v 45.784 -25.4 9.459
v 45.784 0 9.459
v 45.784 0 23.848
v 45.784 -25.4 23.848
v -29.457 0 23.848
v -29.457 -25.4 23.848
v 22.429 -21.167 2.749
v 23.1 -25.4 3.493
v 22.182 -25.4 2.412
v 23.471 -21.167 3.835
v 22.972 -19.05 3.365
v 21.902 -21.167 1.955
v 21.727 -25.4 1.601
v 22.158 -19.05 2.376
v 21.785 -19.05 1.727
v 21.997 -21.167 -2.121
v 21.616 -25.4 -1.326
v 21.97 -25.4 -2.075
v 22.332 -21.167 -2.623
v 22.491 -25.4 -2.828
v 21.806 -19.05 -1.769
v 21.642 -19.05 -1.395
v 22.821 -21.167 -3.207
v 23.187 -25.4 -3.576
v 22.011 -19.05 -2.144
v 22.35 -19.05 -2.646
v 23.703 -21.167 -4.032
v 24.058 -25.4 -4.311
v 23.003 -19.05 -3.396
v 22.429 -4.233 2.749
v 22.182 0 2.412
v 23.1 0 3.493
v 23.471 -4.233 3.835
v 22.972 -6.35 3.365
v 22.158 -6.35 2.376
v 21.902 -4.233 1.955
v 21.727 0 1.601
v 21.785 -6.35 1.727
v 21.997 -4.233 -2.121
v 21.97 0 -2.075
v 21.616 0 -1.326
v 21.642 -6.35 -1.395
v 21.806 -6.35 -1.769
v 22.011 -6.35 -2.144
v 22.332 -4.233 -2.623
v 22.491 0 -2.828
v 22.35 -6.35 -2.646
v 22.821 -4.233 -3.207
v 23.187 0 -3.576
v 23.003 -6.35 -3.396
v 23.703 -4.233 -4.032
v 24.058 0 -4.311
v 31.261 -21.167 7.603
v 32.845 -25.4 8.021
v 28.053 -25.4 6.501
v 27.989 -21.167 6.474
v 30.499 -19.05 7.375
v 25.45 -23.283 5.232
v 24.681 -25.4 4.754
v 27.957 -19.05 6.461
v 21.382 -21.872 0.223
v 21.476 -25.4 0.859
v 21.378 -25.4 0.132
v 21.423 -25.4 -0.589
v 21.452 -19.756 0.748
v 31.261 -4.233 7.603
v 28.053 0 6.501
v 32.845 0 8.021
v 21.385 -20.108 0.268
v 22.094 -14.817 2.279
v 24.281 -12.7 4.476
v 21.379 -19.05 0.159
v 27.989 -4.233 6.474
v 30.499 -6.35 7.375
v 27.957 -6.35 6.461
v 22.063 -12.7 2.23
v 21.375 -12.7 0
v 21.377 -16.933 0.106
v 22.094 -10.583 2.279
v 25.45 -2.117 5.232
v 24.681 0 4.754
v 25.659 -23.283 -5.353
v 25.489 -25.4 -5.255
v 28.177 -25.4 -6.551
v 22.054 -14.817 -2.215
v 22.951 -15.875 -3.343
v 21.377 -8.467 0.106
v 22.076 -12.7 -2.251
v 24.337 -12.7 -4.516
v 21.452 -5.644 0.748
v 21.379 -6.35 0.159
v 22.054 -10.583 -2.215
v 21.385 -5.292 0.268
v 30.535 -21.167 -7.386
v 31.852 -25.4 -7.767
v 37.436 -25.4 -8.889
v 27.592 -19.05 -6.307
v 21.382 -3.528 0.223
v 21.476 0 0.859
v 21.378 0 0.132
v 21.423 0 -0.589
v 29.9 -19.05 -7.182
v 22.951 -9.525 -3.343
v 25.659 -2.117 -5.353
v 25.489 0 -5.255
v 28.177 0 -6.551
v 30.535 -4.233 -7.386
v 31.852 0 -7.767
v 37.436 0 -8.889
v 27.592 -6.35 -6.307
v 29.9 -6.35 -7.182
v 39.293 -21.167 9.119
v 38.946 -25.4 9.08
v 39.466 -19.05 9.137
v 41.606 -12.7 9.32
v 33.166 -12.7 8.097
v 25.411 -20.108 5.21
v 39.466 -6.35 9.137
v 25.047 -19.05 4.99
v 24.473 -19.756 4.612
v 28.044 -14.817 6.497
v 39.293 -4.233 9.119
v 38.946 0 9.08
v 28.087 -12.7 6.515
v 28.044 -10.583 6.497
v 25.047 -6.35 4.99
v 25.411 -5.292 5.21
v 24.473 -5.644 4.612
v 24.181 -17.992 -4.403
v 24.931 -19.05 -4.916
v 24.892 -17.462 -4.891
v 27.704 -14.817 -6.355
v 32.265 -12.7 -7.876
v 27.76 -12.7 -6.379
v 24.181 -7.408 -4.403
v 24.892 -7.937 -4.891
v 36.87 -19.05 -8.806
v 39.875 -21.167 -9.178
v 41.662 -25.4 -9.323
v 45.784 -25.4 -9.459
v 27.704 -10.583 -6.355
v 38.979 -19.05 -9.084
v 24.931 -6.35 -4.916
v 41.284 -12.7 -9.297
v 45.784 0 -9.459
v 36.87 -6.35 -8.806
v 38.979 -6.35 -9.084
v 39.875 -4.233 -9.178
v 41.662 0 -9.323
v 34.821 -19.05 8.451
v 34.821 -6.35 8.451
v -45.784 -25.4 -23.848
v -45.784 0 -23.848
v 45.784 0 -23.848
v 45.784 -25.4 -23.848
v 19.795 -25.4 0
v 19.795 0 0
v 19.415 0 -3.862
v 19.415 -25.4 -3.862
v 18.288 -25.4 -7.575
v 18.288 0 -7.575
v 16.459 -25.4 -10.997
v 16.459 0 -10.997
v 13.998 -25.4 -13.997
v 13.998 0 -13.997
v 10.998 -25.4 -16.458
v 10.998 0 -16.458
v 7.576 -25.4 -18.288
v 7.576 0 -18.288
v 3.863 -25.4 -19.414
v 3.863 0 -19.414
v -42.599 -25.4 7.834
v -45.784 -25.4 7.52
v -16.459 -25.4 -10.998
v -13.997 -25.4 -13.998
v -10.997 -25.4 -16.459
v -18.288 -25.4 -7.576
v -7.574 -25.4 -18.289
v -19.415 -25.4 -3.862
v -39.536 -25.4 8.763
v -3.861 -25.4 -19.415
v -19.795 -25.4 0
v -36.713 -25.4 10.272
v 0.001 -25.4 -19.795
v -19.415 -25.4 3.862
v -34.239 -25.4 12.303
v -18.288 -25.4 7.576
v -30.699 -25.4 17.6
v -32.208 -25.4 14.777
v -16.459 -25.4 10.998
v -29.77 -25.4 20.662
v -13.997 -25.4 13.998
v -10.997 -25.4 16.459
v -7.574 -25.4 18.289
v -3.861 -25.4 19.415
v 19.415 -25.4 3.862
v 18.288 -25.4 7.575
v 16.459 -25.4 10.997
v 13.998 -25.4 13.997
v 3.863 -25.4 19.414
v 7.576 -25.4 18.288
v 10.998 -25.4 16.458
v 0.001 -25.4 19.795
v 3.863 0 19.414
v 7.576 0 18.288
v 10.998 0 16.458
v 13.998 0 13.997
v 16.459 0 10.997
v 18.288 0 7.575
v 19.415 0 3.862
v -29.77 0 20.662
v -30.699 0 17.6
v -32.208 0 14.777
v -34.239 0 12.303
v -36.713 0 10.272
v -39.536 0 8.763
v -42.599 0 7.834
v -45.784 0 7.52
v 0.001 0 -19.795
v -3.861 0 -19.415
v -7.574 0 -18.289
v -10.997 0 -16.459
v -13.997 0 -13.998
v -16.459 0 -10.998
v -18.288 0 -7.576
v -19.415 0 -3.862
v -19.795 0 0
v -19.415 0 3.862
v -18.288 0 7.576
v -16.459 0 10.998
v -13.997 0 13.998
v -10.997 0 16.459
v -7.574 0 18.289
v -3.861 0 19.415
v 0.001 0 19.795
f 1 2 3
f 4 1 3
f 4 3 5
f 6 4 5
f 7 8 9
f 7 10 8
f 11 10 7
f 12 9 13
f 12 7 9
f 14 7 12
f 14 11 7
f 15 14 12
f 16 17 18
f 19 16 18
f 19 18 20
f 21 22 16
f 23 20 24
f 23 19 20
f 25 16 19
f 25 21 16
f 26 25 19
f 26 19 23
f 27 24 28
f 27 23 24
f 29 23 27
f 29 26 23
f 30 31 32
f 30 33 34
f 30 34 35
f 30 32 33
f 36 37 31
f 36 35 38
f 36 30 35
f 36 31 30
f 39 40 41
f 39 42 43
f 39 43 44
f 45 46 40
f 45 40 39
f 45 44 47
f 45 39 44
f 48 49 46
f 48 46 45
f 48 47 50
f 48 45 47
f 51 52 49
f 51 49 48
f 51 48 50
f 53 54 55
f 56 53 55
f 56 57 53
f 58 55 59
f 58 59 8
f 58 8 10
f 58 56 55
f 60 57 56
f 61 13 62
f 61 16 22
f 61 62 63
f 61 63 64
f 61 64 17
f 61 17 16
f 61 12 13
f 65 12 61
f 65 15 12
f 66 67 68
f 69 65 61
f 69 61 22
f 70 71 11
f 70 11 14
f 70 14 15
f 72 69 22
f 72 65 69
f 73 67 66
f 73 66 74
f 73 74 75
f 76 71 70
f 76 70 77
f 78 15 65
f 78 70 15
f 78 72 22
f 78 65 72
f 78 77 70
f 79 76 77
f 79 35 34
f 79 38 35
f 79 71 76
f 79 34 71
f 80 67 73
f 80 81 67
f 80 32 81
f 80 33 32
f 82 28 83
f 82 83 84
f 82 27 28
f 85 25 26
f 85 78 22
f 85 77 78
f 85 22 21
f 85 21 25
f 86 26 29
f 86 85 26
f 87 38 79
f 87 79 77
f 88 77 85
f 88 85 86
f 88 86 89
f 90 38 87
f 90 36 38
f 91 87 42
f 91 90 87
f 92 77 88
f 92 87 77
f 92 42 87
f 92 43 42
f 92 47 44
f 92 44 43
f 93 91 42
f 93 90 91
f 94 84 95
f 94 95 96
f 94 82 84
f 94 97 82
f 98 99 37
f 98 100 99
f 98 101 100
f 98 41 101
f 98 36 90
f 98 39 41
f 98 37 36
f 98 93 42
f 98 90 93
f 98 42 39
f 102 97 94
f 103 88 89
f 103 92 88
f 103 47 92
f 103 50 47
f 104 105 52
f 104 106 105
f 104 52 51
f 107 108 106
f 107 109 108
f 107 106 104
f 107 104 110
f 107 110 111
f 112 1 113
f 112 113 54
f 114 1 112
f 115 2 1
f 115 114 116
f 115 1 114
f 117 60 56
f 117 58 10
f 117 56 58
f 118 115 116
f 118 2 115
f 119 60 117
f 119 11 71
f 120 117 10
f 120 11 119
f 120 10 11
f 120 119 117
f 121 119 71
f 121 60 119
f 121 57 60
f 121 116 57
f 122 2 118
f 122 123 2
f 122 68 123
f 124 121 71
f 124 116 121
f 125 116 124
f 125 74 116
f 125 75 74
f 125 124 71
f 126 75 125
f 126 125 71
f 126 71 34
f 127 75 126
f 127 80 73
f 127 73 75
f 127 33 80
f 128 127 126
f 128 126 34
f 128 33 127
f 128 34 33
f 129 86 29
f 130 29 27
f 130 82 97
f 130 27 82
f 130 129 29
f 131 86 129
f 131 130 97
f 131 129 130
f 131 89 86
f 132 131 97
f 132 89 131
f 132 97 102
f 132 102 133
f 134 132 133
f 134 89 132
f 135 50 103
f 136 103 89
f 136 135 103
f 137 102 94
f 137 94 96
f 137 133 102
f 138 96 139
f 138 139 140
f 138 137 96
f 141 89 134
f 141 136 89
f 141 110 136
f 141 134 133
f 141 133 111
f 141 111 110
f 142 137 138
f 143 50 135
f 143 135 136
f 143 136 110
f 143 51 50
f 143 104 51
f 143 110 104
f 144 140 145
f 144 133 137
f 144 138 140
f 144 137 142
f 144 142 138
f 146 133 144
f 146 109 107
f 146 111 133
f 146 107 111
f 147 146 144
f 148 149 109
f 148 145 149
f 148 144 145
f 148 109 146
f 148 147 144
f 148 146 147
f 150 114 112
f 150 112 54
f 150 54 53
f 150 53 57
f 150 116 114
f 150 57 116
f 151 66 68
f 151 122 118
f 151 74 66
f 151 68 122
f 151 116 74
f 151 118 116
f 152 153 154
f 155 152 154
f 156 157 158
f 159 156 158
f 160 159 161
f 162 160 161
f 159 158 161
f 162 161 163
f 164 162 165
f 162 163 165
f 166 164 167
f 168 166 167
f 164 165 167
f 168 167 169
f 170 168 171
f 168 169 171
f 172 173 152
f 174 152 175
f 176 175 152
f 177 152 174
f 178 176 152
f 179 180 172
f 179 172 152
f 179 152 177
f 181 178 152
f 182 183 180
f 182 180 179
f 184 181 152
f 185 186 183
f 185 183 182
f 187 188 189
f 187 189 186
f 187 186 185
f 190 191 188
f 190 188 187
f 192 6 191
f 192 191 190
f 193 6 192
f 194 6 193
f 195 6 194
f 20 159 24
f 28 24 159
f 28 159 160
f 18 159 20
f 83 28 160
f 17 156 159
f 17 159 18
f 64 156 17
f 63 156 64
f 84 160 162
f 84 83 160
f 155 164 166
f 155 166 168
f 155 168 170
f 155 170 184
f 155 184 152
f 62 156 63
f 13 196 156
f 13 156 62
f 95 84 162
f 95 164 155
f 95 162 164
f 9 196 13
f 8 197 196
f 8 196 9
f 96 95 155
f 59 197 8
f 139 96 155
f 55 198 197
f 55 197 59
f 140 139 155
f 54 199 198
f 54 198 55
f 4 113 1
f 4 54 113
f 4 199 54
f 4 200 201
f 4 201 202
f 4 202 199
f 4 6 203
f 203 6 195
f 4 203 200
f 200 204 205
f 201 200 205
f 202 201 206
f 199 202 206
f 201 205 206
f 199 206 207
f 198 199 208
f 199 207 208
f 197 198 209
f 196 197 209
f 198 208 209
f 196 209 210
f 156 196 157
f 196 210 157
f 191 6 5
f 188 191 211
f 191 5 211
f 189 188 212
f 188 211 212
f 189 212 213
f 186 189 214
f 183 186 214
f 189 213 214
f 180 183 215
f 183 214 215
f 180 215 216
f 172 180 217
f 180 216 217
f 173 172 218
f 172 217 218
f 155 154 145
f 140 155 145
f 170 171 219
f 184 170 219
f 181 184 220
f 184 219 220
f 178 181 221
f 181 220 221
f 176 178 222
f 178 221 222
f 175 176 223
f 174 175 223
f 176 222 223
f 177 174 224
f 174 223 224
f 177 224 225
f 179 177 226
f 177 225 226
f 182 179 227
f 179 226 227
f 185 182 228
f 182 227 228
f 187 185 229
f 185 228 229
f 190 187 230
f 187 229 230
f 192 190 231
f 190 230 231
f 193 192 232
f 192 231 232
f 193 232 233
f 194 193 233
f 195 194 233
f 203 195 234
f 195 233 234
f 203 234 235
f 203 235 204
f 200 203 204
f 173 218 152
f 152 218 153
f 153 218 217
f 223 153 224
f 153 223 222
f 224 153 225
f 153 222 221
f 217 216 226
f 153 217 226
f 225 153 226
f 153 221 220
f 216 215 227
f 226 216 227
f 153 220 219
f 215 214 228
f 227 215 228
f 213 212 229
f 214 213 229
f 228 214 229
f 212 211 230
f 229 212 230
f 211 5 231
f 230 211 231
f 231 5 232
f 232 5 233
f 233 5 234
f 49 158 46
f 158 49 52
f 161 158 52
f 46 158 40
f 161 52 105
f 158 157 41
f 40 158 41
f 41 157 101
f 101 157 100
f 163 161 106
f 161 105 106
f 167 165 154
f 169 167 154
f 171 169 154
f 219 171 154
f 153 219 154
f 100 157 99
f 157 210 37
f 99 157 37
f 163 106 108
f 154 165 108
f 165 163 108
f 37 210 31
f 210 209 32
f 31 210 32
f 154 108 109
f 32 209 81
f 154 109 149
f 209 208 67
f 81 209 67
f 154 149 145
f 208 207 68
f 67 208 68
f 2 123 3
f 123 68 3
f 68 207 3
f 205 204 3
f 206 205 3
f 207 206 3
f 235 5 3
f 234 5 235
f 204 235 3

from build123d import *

# Parameters (mm, degrees)
F1_DEPTH = 25.4
F2_DEPTH = 25.4


with BuildPart() as f1:
    # F0 (on Front) → F1 (new body)
    with BuildSketch(Plane.XZ):
        with BuildLine():
            ThreePointArc((-29.4565436219, 23.8478247362), (-34.2387511178, 12.3025545416), (-45.7840213124, 7.5203470458))
            Line((-45.7840213124, 7.5203470458), (-45.7840213124, -23.8478247362))
            Line((-45.7840213124, -23.8478247362), (-3.5301e-06, -23.8478247362))
            ThreePointArc((-3.5301e-06, -23.8478247362), (2.0304351181, -21.7171458616), (3.8633102693, -19.4143123352))
            ThreePointArc((3.8633102693, -19.4143123352), (-19.7949662714, 0), (3.8633102693, 19.4143123352))
            ThreePointArc((3.8633102693, 19.4143123352), (2.0304351181, 21.7171458616), (-3.5301e-06, 23.8478247362))
            Line((-3.5301e-06, 23.8478247362), (-29.4565436219, 23.8478247362))
        make_face()
    extrude(amount=F1_DEPTH)

    # F0 (on Front) → F2 (join)
    with BuildSketch(Plane.XZ):
        with BuildLine():
            Line((45.7840142522, 23.8478247362), (-3.5301e-06, 23.8478247362))
            ThreePointArc((-3.5301e-06, 23.8478247362), (2.0304351181, 21.7171458616), (3.8633102693, 19.4143123352))
            ThreePointArc((3.8633102693, 19.4143123352), (15.3022022298, 12.5572009861), (19.7949662714, 0))
            ThreePointArc((19.7949662714, 0), (15.3022022298, -12.5572009861), (3.8633102693, -19.4143123352))
            ThreePointArc((3.8633102693, -19.4143123352), (2.0304351181, -21.7171458616), (-3.5301e-06, -23.8478247362))
            Line((-3.5301e-06, -23.8478247362), (45.7840283725, -23.8478247362))
            Line((45.7840283725, -23.8478247362), (45.7840241128, -9.4592027554))
            add(Edge.make_bspline(
                [(45.784018512, 9.4592027554), (21.3751961487, 9.4592016702), (21.3751989491, -1.0852e-06), (21.3752017495, -9.4592038407), (45.7840241128, -9.4592027554)],
                knots=[1.5707964415, 1.5707964415, 1.5707964415, 3.1415927683, 3.1415927683, 4.7123890951, 4.7123890951, 4.7123890951], degree=2, weights=[1, 0.7071067812, 1, 0.7071067812, 1]))
            Line((45.784018512, 9.4592027554), (45.7840142522, 23.8478247362))
        make_face()
    extrude(amount=F2_DEPTH)


solid = f1.part
